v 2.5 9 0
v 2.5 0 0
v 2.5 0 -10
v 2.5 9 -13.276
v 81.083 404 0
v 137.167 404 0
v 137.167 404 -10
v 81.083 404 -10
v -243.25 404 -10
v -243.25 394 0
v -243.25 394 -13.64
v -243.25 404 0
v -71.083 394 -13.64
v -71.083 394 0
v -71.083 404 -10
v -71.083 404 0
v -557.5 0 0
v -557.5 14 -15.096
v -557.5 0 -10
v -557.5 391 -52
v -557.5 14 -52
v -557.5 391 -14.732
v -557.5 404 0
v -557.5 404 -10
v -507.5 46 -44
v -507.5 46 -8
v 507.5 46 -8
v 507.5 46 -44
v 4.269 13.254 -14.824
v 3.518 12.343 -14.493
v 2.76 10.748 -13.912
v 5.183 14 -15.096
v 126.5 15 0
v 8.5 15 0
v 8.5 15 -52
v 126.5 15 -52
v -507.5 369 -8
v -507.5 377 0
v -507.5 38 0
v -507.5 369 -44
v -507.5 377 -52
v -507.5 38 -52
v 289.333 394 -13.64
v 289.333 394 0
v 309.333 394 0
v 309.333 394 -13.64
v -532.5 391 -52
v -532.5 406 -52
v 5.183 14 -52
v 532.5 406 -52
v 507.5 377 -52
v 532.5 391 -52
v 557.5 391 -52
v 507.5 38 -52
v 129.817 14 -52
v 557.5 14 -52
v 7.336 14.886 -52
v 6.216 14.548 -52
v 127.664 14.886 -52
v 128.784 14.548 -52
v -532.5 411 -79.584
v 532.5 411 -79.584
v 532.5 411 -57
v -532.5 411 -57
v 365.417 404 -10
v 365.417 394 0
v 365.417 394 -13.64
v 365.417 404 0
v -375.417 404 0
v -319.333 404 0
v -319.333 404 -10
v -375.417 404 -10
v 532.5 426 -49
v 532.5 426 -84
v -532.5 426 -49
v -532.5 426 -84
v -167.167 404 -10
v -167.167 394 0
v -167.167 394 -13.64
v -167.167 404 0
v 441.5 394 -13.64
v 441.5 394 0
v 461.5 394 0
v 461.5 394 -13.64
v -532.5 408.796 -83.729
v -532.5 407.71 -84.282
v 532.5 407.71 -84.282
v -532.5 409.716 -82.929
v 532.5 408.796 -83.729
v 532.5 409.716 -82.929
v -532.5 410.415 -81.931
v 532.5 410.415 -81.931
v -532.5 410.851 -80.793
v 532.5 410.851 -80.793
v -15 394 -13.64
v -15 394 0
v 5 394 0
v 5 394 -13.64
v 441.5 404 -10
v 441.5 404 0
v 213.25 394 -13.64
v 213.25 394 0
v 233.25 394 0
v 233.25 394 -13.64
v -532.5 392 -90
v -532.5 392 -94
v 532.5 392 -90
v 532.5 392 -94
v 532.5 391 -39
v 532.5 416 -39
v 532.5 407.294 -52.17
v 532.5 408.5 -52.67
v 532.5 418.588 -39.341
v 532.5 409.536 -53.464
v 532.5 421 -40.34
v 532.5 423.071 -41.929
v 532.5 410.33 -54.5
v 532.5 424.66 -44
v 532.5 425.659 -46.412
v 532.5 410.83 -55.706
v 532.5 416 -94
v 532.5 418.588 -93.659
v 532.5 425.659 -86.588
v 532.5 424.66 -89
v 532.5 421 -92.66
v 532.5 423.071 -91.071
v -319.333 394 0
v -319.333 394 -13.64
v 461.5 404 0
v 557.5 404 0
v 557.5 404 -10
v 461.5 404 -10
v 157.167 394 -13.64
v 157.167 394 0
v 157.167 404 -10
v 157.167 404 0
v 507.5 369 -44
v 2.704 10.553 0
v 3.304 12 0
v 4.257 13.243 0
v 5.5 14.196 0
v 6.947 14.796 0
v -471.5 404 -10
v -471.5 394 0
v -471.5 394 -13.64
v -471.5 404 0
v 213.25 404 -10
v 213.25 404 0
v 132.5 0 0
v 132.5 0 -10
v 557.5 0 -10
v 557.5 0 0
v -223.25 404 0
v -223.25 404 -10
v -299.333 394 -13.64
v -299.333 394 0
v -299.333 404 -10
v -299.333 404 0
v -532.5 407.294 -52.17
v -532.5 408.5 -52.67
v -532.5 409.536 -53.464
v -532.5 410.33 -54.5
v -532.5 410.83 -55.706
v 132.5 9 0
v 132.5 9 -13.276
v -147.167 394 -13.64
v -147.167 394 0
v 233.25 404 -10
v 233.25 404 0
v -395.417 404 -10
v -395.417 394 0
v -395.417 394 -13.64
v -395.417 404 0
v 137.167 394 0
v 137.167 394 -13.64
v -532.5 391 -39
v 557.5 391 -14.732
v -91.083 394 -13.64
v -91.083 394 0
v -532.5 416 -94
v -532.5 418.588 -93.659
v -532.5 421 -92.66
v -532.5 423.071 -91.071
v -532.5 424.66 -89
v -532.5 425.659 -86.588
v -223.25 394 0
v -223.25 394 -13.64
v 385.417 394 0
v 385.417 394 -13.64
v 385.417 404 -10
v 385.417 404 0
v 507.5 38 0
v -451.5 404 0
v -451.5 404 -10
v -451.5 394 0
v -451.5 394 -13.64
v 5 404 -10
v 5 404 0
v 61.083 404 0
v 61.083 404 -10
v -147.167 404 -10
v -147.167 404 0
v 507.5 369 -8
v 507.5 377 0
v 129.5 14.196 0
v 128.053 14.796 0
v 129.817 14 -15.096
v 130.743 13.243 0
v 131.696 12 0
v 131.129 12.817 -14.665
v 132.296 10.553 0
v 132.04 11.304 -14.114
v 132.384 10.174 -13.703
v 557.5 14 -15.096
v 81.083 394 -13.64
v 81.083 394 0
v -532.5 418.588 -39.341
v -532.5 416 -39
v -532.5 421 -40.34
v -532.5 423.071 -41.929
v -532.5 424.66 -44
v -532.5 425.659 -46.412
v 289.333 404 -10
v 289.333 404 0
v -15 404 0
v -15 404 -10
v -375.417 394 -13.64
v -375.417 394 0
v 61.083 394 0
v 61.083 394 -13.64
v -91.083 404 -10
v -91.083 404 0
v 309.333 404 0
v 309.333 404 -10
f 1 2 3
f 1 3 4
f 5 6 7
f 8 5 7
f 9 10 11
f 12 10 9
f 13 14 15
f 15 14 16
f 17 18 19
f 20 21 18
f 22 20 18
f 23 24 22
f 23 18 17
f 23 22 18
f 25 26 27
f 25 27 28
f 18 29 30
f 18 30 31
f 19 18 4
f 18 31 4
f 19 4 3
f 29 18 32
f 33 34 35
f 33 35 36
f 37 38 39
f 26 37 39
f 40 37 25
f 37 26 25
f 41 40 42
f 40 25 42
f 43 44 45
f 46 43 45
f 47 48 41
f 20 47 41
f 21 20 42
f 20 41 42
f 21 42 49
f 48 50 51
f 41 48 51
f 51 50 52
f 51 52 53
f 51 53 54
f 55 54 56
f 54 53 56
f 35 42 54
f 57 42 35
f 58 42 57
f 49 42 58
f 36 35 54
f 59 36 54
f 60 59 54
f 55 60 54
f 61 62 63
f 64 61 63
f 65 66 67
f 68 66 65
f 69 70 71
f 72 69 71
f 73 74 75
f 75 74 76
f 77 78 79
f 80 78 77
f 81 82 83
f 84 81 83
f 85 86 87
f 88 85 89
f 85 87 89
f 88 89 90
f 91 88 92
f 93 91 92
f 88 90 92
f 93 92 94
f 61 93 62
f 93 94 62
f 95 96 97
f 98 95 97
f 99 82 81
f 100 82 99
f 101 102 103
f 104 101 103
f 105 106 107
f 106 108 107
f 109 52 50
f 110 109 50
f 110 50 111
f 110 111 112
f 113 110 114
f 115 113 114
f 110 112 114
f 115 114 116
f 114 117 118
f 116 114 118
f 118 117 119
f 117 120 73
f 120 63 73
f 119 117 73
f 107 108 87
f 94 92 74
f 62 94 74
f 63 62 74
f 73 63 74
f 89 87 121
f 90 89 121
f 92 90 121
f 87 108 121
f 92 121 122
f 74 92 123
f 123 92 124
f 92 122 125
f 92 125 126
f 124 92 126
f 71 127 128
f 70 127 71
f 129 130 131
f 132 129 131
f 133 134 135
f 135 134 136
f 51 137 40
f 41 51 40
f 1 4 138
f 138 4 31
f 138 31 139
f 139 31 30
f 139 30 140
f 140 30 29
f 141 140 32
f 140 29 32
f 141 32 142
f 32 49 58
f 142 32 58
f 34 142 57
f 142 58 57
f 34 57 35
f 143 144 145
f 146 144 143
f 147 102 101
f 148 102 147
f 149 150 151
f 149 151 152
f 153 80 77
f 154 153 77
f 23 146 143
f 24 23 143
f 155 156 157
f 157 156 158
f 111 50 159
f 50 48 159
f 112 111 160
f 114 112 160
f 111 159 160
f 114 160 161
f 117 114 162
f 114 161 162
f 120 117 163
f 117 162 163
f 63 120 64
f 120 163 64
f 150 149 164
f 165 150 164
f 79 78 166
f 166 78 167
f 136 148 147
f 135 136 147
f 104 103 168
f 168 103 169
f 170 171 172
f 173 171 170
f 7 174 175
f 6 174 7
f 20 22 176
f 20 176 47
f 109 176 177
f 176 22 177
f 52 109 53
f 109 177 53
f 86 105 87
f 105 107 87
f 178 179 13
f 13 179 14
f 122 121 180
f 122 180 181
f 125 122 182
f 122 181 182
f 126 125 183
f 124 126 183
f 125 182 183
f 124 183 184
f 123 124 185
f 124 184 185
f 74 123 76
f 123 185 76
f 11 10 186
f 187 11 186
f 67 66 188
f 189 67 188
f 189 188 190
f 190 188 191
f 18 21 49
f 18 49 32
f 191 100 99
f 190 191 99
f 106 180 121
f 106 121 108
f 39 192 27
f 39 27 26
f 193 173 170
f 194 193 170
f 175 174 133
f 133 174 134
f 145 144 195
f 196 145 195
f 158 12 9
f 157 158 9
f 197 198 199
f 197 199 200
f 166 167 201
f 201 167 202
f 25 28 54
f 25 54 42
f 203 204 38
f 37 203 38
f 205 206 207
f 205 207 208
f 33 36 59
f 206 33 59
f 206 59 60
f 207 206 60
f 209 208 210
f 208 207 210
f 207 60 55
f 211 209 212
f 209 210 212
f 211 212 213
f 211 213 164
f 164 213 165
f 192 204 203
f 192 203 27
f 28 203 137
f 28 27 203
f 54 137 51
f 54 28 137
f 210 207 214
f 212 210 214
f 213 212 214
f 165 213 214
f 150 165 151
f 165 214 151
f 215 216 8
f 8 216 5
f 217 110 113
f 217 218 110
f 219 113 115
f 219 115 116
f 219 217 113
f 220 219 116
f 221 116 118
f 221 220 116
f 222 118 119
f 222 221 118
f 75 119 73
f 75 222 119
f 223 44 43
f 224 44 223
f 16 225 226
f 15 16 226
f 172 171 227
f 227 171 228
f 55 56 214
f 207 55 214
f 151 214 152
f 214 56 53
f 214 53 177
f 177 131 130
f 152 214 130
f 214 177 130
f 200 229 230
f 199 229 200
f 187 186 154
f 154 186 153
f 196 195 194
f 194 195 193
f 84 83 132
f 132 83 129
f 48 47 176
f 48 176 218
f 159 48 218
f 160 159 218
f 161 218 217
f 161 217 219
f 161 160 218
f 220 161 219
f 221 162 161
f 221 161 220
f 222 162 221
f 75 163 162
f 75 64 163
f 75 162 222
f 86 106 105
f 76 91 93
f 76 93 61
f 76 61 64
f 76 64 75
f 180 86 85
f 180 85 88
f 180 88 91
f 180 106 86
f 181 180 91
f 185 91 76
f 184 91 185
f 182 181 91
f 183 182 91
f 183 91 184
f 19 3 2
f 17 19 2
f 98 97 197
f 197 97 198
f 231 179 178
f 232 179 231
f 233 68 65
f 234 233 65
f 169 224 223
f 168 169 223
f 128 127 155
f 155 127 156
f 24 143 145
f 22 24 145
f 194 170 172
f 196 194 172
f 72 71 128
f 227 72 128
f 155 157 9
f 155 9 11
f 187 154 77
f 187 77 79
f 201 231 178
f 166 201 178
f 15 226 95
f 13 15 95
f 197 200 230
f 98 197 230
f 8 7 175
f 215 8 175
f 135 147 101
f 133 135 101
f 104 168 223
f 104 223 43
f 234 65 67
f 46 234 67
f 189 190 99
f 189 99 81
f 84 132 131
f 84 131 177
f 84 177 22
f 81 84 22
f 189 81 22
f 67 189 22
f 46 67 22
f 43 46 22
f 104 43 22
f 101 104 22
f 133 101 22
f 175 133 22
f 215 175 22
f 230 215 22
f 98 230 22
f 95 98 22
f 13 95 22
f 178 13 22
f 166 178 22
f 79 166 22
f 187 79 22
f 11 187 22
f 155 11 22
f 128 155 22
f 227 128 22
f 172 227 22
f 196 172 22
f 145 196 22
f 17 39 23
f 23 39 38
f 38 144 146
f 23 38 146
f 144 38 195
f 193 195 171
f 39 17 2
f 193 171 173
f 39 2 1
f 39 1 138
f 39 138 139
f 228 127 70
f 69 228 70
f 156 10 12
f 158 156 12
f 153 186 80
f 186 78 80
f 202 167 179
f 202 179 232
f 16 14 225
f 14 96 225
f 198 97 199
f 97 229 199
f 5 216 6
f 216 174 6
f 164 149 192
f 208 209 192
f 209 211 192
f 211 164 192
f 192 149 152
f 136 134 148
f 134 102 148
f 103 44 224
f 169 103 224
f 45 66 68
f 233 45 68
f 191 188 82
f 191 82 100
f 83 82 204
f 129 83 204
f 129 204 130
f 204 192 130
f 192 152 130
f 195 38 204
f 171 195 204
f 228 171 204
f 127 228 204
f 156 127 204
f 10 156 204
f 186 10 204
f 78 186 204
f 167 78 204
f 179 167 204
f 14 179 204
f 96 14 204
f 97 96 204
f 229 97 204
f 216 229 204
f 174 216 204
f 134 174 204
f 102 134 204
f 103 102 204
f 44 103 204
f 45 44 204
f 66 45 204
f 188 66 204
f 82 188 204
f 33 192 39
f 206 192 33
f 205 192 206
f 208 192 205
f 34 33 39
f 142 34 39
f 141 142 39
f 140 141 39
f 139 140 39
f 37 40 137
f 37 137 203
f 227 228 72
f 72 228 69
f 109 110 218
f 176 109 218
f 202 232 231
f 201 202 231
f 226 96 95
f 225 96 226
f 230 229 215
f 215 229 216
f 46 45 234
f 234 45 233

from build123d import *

# Parameters (mm, degrees)
BOSS_EXTRUDE1_DEPTH = 557.5
SKETCH2_W           = 50
SKETCH2_H           = 52
BOSS_EXTRUDE2_DEPTH = 323
BOSS_EXTRUDE3_DEPTH = 1115
SKETCH4_W           = 130
SKETCH4_H           = 15
CUT_EXTRUDE1_DEPTH  = 691.453655215
FILLET1_R           = 6
SKETCH8_W           = 20
SKETCH8_H           = 10
CUT_EXTRUDE3_DEPTH  = 691.453655215
SKETCH10_W          = 1065
SKETCH10_H          = 35
BOSS_EXTRUDE7_DEPTH = 13
BOSS_EXTRUDE8_DEPTH = 532.5
FILLET3_R           = 10
FILLET4_R           = 5
CHAMFER1_SIZE       = 8


with BuildPart() as part:
    # Sketch1 → Boss-Extrude1 (new, symmetric)
    with BuildSketch(Plane(origin=(0, 0, 0), x_dir=(0, 0, -1), z_dir=(1, 0, 0))):
        Polygon((0, 0), (0, 46), (52, 46), (52, 14), (15.09558328, 14), (10, 0), align=None)
    extrude(amount=BOSS_EXTRUDE1_DEPTH, both=True)

    # Sketch2 → Boss-Extrude2 (add)
    with BuildSketch(Plane(origin=(0, 46, 0), x_dir=(1, 0, 0), z_dir=(0, 1, 0))):
        with Locations((-532.5, 26)):
            Rectangle(SKETCH2_W, SKETCH2_H)
        with Locations((532.5, 26)):
            Rectangle(SKETCH2_W, SKETCH2_H)
    extrude(amount=BOSS_EXTRUDE2_DEPTH)

    # Sketch3 → Boss-Extrude3 (add)
    with BuildSketch(Plane(origin=(557.5, 0, 0), x_dir=(0, 0, -1), z_dir=(1, 0, 0))):
        Polygon((0, 369), (0, 404), (10, 404), (14.731613045, 391), (52, 391), (52, 369), align=None)
    extrude(amount=-BOSS_EXTRUDE3_DEPTH)

    # Sketch4 → Cut-Extrude1 (cut, through all)
    with BuildSketch(Plane.XY):
        with Locations((67.5, 7.5)):
            Rectangle(SKETCH4_W, SKETCH4_H)
    extrude(amount=-CUT_EXTRUDE1_DEPTH, mode=Mode.SUBTRACT)

    # Fillet1
    fillet1_edges = [part.edges().sort_by_distance(p)[0] for p in [
        (132.5, 15, -26),
        (2.5, 15, -26),
    ]]
    fillet(fillet1_edges, radius=FILLET1_R)

    # Sketch8 → Cut-Extrude3 (cut, through all)
    with BuildSketch(Plane.XY):
        with Locations((-461.5, 399)):
            Rectangle(SKETCH8_W, SKETCH8_H)
        with Locations((-385.416666667, 399)):
            Rectangle(SKETCH8_W, SKETCH8_H)
        with Locations((-309.333333333, 399)):
            Rectangle(SKETCH8_W, SKETCH8_H)
        with Locations((-233.25, 399)):
            Rectangle(SKETCH8_W, SKETCH8_H)
        with Locations((-157.166666667, 399)):
            Rectangle(SKETCH8_W, SKETCH8_H)
        with Locations((-81.083333333, 399)):
            Rectangle(SKETCH8_W, SKETCH8_H)
        with Locations((-5, 399)):
            Rectangle(SKETCH8_W, SKETCH8_H)
        with Locations((71.083333333, 399)):
            Rectangle(SKETCH8_W, SKETCH8_H)
        with Locations((147.166666667, 399)):
            Rectangle(SKETCH8_W, SKETCH8_H)
        with Locations((223.25, 399)):
            Rectangle(SKETCH8_W, SKETCH8_H)
        with Locations((299.333333333, 399)):
            Rectangle(SKETCH8_W, SKETCH8_H)
        with Locations((375.416666667, 399)):
            Rectangle(SKETCH8_W, SKETCH8_H)
        with Locations((451.5, 399)):
            Rectangle(SKETCH8_W, SKETCH8_H)
    extrude(amount=-CUT_EXTRUDE3_DEPTH, mode=Mode.SUBTRACT)

    # Sketch10 → Boss-Extrude7 (add)
    with BuildSketch(Plane(origin=(0, 0, -52), x_dir=(-1, 0, 0), z_dir=(0, 0, -1))):
        with Locations((0, 408.5)):
            Rectangle(SKETCH10_W, SKETCH10_H)
    extrude(amount=-BOSS_EXTRUDE7_DEPTH)

    # Sketch11 → Boss-Extrude8 (add, symmetric)
    with BuildSketch(Plane(origin=(0, 0, 0), x_dir=(0, 0, -1), z_dir=(1, 0, 0))):
        Polygon((39, 426), (94, 426), (94, 392), (90, 392), (83.084565549, 411), (39, 411), align=None)
    extrude(amount=BOSS_EXTRUDE8_DEPTH, both=True)

    # Fillet3
    fillet3_edges = [part.edges().sort_by_distance(p)[0] for p in [
        (0, 426, -39),
        (0, 426, -94),
    ]]
    fillet(fillet3_edges, radius=FILLET3_R)

    # Fillet4
    fillet4_edges = [part.edges().sort_by_distance(p)[0] for p in [
        (0, 411, -52),
        (0, 411, -83.084565549),
    ]]
    fillet(fillet4_edges, radius=FILLET4_R)

    # Chamfer1
    chamfer1_edges = [part.edges().sort_by_distance(p)[0] for p in [
        (0, 46, 0),
        (0, 46, -52),
        (0, 369, -52),
        (0, 369, 0),
    ]]
    chamfer(chamfer1_edges, length=CHAMFER1_SIZE)


solid = part.part
